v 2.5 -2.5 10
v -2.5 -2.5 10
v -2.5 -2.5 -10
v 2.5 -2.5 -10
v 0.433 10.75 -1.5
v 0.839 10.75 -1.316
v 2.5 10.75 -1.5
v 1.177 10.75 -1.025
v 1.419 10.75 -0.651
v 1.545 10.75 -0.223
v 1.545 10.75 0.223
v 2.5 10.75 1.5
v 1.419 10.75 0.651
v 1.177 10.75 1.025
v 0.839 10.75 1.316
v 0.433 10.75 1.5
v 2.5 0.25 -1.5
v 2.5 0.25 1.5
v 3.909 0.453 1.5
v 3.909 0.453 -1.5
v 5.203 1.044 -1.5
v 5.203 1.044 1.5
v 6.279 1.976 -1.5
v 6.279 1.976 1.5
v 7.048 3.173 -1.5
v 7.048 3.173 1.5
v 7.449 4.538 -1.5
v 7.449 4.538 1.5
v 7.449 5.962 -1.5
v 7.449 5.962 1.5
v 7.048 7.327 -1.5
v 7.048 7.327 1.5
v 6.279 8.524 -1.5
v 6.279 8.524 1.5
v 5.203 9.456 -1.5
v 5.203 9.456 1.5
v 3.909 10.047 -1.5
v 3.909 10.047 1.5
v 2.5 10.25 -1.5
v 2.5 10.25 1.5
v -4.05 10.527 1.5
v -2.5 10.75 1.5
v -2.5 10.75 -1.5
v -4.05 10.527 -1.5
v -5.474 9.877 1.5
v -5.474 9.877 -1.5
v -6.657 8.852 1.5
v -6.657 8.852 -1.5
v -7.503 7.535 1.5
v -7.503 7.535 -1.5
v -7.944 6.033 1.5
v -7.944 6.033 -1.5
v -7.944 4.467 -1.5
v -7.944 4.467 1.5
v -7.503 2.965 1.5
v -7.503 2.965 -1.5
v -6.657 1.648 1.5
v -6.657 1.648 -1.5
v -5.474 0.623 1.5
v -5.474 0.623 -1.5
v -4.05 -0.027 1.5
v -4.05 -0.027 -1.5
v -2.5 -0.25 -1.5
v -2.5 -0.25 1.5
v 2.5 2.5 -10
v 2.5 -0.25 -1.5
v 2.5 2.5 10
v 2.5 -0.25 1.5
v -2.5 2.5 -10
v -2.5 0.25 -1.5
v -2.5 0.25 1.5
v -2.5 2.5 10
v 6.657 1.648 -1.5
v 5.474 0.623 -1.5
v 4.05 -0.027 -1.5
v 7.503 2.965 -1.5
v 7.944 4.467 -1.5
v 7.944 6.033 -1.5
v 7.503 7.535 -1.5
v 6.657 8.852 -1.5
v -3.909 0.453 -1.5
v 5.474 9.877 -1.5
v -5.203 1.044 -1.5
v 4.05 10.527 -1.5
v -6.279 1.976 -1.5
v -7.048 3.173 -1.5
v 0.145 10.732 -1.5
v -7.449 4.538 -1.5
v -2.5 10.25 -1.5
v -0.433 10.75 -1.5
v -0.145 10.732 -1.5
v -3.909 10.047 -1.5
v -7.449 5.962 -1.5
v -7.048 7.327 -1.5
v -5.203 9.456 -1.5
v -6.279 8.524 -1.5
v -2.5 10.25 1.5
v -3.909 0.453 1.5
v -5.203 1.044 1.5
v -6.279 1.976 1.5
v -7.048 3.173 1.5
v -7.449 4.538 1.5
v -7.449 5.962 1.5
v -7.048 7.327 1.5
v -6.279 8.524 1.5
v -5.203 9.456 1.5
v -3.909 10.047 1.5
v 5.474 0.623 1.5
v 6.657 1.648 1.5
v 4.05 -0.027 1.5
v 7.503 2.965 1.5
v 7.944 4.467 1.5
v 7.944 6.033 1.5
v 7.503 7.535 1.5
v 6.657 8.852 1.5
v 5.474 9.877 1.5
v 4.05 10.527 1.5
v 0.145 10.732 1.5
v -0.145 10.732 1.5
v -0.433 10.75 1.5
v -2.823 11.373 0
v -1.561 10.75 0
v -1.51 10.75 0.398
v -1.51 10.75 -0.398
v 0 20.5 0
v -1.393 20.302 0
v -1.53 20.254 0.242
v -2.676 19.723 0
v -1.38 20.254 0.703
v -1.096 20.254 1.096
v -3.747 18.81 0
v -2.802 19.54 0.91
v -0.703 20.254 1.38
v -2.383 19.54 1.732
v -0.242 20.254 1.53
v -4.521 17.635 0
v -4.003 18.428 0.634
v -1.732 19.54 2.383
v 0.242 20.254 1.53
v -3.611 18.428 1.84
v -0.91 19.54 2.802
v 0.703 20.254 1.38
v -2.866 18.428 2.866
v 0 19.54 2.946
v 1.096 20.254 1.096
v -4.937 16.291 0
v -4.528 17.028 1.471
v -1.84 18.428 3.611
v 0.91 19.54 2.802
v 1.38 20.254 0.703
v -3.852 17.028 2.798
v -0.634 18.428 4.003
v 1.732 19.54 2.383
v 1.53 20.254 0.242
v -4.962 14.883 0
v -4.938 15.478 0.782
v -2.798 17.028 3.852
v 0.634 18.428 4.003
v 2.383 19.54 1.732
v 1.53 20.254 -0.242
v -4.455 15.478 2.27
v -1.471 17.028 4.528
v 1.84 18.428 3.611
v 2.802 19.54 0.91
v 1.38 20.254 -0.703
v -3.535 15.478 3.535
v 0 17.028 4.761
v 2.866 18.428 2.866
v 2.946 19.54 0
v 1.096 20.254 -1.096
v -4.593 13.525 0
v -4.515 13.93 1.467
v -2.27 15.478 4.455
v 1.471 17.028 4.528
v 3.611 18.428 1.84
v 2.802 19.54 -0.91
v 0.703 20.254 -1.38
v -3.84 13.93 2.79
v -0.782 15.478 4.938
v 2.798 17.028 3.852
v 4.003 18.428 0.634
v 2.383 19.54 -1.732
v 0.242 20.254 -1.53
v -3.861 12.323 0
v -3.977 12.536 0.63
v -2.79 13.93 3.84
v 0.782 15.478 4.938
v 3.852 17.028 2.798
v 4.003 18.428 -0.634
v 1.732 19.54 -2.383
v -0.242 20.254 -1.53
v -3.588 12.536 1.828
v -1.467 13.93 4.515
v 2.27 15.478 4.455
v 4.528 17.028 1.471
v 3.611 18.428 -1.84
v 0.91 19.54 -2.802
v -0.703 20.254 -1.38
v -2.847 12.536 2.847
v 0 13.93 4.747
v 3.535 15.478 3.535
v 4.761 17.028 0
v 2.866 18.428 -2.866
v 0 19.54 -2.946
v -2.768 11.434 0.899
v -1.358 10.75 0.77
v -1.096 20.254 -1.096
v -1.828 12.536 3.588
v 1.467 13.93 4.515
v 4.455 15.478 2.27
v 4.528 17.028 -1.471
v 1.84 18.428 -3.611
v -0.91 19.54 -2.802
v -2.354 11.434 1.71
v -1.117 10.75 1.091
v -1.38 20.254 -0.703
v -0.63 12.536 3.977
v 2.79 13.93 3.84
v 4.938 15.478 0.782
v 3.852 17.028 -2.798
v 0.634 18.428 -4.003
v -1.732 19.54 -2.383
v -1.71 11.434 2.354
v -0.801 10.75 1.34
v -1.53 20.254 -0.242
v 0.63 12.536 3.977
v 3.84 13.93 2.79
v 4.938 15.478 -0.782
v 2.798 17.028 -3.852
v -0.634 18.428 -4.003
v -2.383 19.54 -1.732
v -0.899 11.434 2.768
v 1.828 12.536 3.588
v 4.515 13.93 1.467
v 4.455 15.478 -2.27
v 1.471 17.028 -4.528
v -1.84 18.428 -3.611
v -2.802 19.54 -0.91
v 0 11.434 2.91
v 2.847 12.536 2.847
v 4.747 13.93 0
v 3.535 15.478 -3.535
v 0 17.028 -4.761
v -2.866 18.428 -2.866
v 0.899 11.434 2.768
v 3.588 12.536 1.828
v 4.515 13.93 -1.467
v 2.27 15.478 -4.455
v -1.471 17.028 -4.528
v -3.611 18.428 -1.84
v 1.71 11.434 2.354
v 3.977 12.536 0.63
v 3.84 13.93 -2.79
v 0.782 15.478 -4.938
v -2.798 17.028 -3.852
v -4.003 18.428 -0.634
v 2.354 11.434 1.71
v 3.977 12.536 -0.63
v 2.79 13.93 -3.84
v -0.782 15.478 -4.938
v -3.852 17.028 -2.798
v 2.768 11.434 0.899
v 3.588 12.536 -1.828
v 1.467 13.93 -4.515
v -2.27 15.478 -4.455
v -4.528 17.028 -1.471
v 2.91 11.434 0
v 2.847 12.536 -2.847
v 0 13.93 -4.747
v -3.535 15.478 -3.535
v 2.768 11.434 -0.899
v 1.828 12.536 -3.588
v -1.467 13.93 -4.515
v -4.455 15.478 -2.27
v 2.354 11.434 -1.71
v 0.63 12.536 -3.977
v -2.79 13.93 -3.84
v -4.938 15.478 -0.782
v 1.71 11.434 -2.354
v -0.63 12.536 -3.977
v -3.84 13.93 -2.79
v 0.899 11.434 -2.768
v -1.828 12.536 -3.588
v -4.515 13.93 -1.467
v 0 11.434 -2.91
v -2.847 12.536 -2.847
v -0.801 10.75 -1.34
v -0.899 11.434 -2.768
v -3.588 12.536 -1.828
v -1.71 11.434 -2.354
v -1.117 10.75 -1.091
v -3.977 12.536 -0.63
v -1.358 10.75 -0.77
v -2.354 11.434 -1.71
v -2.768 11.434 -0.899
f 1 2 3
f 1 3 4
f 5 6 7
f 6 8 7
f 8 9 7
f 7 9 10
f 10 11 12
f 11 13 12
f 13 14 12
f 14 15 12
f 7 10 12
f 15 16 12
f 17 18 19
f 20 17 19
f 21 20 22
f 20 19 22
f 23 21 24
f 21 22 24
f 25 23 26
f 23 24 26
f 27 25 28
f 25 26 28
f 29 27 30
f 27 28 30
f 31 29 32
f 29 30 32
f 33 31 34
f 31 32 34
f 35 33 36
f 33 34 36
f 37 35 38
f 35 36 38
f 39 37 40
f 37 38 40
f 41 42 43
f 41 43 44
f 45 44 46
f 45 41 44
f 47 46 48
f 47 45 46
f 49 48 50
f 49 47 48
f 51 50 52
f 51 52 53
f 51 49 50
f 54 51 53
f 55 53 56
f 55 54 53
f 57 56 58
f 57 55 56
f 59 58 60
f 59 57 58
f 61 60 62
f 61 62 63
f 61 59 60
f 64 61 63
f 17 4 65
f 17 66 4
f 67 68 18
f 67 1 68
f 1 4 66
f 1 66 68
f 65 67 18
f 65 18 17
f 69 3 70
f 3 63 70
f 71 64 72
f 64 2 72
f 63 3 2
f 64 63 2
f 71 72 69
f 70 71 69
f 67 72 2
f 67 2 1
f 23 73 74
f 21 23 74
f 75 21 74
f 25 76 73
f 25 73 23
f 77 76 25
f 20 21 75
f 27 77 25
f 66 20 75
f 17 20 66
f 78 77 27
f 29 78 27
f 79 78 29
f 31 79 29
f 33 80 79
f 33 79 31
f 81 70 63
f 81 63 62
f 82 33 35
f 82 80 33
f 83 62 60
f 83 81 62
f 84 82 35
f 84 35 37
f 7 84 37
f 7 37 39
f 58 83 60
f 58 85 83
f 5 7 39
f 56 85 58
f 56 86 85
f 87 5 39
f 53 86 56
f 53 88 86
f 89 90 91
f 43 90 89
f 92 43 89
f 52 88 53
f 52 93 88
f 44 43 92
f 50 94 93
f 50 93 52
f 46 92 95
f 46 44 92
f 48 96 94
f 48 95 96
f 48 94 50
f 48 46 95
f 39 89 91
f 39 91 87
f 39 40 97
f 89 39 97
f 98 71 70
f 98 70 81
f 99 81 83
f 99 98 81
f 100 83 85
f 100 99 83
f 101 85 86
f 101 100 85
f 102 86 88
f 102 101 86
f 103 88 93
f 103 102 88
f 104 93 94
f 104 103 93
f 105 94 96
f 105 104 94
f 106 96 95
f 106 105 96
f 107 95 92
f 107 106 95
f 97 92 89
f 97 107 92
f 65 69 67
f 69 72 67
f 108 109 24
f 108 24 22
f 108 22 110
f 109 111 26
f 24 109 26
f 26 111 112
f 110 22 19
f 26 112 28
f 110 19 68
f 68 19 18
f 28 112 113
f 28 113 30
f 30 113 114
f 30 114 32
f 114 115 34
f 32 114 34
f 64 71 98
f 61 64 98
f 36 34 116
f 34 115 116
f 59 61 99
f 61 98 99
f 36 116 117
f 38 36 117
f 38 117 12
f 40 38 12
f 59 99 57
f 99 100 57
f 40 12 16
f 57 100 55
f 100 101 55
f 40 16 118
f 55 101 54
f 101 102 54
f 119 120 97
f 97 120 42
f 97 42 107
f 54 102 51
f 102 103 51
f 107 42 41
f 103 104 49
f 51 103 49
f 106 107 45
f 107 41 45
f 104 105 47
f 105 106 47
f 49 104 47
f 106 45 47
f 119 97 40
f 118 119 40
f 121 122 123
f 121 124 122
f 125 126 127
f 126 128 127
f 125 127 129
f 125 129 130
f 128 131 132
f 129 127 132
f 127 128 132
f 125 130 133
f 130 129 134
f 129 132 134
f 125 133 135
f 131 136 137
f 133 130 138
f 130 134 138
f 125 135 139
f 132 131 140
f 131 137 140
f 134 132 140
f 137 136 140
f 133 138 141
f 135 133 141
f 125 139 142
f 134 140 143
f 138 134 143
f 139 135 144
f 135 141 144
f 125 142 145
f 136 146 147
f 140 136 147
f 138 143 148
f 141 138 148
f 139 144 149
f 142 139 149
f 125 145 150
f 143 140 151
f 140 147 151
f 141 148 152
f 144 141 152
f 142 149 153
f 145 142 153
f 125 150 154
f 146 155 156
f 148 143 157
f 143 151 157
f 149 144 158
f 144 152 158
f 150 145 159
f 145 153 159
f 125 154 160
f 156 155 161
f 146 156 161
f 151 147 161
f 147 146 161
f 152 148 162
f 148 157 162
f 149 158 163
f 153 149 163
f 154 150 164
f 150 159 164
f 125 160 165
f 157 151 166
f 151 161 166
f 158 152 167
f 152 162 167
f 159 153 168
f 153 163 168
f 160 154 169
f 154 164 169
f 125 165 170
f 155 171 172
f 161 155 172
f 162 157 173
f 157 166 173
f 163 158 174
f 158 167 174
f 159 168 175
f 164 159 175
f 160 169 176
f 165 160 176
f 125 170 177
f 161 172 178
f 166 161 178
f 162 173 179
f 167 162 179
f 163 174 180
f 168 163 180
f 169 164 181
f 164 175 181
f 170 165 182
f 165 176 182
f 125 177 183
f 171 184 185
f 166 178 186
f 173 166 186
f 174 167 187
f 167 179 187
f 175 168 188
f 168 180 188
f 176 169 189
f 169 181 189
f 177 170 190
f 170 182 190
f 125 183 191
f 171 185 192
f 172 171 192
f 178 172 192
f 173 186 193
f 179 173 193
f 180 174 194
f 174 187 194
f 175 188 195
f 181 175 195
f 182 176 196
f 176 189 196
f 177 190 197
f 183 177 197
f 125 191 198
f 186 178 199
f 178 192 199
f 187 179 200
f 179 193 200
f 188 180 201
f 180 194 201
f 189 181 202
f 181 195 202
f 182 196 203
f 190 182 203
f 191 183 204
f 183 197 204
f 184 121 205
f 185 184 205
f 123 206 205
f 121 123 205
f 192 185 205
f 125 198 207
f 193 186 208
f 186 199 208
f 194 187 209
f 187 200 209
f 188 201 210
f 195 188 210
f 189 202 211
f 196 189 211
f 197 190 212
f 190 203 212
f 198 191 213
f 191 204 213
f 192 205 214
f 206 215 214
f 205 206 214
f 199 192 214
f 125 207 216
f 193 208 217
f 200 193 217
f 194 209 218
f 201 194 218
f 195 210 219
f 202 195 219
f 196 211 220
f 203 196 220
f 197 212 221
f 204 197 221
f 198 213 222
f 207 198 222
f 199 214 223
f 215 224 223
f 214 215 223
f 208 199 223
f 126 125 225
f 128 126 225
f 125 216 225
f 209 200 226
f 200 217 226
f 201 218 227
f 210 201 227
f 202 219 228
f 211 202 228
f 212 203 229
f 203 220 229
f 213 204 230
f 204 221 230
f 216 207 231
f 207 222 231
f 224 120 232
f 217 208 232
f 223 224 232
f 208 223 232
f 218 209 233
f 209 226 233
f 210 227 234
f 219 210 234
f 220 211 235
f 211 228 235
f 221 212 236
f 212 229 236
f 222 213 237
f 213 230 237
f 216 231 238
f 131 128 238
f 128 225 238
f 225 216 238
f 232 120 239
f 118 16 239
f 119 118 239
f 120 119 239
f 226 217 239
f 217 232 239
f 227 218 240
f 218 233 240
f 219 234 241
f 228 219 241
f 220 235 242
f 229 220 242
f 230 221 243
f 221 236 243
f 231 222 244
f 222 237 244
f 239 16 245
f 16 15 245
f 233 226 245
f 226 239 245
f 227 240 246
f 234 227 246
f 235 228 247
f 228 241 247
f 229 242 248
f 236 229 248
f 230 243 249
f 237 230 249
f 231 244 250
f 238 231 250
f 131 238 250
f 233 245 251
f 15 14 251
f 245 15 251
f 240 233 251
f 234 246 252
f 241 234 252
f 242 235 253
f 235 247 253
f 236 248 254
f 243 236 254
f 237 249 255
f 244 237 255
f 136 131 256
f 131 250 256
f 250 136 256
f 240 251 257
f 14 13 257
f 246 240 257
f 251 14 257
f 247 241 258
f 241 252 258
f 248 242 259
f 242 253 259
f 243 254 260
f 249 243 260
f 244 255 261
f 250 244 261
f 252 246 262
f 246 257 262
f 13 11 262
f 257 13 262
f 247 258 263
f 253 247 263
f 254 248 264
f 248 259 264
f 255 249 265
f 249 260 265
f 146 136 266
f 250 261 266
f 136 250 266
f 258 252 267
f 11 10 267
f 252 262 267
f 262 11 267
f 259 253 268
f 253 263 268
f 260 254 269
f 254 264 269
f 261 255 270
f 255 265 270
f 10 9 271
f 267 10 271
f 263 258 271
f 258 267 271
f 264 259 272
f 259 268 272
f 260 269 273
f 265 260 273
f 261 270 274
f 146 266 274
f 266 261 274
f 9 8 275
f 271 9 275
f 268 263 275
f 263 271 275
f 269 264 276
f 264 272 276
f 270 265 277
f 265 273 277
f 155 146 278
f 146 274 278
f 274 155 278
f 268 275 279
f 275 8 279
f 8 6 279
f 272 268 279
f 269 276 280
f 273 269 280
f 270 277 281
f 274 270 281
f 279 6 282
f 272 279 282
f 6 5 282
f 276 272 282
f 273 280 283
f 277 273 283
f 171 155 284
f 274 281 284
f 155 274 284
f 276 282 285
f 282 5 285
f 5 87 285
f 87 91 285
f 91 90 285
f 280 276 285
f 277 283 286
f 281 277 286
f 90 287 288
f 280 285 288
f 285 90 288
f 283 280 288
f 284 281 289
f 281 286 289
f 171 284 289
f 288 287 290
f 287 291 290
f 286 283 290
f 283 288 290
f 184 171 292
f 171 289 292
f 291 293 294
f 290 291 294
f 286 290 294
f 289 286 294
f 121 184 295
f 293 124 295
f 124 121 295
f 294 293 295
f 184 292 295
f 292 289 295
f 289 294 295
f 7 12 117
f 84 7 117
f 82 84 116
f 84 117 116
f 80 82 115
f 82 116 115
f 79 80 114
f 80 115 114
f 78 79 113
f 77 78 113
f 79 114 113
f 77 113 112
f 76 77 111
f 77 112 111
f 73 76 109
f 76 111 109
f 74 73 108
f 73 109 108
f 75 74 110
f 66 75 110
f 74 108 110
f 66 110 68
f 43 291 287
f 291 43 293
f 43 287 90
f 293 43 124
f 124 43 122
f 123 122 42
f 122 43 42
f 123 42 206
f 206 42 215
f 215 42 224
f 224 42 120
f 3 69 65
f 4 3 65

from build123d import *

# Parameters (mm, degrees)
SKETCH1_W           = 5
SKETCH1_H           = 5
BOSS_EXTRUDE1_DEPTH = 10
BOSS_EXTRUDE2_DEPTH = 1.5


with BuildPart() as part:
    # Sketch1 → Boss-Extrude1 (new, symmetric)
    with BuildSketch(Plane.XY):
        Rectangle(SKETCH1_W, SKETCH1_H)
    extrude(amount=BOSS_EXTRUDE1_DEPTH, both=True)

    # Sketch2 → Boss-Extrude2 (add, symmetric)
    with BuildSketch(Plane.XY):
        with BuildLine():
            Line((0, 0.25), (-2.5, 0.25))
            ThreePointArc((-2.5, 0.25), (-7.5, 5.25), (-2.5, 10.25))
            Line((-2.5, 10.25), (0, 10.25))
            Line((0, 10.25), (0, 10.75))
            Line((0, 10.75), (-2.5, 10.75))
            ThreePointArc((-2.5, 10.75), (-8, 5.25), (-2.5, -0.25))
            Line((-2.5, -0.25), (0, -0.25))
            Line((0, -0.25), (0, 0.25))
        make_face()
    boss_extrude2 = extrude(amount=BOSS_EXTRUDE2_DEPTH, both=True)

    # Mirror1: Boss-Extrude2 across plane
    add(boss_extrude2.mirror(Plane(origin=(0, 0, 0), x_dir=(0, 0, 1), z_dir=(1, 0, 0))))

    # Sketch3 → Revolve3 (revolve)
    with BuildSketch(Plane.XY):
        with BuildLine():
            Line((0, 10.5), (0, 20.5))
            ThreePointArc((0, 20.5), (-5, 15.5), (0, 10.5))
        make_face()
    revolve(axis=Axis((0, 0, 0), (0, 1, 0)))


solid = part.part
